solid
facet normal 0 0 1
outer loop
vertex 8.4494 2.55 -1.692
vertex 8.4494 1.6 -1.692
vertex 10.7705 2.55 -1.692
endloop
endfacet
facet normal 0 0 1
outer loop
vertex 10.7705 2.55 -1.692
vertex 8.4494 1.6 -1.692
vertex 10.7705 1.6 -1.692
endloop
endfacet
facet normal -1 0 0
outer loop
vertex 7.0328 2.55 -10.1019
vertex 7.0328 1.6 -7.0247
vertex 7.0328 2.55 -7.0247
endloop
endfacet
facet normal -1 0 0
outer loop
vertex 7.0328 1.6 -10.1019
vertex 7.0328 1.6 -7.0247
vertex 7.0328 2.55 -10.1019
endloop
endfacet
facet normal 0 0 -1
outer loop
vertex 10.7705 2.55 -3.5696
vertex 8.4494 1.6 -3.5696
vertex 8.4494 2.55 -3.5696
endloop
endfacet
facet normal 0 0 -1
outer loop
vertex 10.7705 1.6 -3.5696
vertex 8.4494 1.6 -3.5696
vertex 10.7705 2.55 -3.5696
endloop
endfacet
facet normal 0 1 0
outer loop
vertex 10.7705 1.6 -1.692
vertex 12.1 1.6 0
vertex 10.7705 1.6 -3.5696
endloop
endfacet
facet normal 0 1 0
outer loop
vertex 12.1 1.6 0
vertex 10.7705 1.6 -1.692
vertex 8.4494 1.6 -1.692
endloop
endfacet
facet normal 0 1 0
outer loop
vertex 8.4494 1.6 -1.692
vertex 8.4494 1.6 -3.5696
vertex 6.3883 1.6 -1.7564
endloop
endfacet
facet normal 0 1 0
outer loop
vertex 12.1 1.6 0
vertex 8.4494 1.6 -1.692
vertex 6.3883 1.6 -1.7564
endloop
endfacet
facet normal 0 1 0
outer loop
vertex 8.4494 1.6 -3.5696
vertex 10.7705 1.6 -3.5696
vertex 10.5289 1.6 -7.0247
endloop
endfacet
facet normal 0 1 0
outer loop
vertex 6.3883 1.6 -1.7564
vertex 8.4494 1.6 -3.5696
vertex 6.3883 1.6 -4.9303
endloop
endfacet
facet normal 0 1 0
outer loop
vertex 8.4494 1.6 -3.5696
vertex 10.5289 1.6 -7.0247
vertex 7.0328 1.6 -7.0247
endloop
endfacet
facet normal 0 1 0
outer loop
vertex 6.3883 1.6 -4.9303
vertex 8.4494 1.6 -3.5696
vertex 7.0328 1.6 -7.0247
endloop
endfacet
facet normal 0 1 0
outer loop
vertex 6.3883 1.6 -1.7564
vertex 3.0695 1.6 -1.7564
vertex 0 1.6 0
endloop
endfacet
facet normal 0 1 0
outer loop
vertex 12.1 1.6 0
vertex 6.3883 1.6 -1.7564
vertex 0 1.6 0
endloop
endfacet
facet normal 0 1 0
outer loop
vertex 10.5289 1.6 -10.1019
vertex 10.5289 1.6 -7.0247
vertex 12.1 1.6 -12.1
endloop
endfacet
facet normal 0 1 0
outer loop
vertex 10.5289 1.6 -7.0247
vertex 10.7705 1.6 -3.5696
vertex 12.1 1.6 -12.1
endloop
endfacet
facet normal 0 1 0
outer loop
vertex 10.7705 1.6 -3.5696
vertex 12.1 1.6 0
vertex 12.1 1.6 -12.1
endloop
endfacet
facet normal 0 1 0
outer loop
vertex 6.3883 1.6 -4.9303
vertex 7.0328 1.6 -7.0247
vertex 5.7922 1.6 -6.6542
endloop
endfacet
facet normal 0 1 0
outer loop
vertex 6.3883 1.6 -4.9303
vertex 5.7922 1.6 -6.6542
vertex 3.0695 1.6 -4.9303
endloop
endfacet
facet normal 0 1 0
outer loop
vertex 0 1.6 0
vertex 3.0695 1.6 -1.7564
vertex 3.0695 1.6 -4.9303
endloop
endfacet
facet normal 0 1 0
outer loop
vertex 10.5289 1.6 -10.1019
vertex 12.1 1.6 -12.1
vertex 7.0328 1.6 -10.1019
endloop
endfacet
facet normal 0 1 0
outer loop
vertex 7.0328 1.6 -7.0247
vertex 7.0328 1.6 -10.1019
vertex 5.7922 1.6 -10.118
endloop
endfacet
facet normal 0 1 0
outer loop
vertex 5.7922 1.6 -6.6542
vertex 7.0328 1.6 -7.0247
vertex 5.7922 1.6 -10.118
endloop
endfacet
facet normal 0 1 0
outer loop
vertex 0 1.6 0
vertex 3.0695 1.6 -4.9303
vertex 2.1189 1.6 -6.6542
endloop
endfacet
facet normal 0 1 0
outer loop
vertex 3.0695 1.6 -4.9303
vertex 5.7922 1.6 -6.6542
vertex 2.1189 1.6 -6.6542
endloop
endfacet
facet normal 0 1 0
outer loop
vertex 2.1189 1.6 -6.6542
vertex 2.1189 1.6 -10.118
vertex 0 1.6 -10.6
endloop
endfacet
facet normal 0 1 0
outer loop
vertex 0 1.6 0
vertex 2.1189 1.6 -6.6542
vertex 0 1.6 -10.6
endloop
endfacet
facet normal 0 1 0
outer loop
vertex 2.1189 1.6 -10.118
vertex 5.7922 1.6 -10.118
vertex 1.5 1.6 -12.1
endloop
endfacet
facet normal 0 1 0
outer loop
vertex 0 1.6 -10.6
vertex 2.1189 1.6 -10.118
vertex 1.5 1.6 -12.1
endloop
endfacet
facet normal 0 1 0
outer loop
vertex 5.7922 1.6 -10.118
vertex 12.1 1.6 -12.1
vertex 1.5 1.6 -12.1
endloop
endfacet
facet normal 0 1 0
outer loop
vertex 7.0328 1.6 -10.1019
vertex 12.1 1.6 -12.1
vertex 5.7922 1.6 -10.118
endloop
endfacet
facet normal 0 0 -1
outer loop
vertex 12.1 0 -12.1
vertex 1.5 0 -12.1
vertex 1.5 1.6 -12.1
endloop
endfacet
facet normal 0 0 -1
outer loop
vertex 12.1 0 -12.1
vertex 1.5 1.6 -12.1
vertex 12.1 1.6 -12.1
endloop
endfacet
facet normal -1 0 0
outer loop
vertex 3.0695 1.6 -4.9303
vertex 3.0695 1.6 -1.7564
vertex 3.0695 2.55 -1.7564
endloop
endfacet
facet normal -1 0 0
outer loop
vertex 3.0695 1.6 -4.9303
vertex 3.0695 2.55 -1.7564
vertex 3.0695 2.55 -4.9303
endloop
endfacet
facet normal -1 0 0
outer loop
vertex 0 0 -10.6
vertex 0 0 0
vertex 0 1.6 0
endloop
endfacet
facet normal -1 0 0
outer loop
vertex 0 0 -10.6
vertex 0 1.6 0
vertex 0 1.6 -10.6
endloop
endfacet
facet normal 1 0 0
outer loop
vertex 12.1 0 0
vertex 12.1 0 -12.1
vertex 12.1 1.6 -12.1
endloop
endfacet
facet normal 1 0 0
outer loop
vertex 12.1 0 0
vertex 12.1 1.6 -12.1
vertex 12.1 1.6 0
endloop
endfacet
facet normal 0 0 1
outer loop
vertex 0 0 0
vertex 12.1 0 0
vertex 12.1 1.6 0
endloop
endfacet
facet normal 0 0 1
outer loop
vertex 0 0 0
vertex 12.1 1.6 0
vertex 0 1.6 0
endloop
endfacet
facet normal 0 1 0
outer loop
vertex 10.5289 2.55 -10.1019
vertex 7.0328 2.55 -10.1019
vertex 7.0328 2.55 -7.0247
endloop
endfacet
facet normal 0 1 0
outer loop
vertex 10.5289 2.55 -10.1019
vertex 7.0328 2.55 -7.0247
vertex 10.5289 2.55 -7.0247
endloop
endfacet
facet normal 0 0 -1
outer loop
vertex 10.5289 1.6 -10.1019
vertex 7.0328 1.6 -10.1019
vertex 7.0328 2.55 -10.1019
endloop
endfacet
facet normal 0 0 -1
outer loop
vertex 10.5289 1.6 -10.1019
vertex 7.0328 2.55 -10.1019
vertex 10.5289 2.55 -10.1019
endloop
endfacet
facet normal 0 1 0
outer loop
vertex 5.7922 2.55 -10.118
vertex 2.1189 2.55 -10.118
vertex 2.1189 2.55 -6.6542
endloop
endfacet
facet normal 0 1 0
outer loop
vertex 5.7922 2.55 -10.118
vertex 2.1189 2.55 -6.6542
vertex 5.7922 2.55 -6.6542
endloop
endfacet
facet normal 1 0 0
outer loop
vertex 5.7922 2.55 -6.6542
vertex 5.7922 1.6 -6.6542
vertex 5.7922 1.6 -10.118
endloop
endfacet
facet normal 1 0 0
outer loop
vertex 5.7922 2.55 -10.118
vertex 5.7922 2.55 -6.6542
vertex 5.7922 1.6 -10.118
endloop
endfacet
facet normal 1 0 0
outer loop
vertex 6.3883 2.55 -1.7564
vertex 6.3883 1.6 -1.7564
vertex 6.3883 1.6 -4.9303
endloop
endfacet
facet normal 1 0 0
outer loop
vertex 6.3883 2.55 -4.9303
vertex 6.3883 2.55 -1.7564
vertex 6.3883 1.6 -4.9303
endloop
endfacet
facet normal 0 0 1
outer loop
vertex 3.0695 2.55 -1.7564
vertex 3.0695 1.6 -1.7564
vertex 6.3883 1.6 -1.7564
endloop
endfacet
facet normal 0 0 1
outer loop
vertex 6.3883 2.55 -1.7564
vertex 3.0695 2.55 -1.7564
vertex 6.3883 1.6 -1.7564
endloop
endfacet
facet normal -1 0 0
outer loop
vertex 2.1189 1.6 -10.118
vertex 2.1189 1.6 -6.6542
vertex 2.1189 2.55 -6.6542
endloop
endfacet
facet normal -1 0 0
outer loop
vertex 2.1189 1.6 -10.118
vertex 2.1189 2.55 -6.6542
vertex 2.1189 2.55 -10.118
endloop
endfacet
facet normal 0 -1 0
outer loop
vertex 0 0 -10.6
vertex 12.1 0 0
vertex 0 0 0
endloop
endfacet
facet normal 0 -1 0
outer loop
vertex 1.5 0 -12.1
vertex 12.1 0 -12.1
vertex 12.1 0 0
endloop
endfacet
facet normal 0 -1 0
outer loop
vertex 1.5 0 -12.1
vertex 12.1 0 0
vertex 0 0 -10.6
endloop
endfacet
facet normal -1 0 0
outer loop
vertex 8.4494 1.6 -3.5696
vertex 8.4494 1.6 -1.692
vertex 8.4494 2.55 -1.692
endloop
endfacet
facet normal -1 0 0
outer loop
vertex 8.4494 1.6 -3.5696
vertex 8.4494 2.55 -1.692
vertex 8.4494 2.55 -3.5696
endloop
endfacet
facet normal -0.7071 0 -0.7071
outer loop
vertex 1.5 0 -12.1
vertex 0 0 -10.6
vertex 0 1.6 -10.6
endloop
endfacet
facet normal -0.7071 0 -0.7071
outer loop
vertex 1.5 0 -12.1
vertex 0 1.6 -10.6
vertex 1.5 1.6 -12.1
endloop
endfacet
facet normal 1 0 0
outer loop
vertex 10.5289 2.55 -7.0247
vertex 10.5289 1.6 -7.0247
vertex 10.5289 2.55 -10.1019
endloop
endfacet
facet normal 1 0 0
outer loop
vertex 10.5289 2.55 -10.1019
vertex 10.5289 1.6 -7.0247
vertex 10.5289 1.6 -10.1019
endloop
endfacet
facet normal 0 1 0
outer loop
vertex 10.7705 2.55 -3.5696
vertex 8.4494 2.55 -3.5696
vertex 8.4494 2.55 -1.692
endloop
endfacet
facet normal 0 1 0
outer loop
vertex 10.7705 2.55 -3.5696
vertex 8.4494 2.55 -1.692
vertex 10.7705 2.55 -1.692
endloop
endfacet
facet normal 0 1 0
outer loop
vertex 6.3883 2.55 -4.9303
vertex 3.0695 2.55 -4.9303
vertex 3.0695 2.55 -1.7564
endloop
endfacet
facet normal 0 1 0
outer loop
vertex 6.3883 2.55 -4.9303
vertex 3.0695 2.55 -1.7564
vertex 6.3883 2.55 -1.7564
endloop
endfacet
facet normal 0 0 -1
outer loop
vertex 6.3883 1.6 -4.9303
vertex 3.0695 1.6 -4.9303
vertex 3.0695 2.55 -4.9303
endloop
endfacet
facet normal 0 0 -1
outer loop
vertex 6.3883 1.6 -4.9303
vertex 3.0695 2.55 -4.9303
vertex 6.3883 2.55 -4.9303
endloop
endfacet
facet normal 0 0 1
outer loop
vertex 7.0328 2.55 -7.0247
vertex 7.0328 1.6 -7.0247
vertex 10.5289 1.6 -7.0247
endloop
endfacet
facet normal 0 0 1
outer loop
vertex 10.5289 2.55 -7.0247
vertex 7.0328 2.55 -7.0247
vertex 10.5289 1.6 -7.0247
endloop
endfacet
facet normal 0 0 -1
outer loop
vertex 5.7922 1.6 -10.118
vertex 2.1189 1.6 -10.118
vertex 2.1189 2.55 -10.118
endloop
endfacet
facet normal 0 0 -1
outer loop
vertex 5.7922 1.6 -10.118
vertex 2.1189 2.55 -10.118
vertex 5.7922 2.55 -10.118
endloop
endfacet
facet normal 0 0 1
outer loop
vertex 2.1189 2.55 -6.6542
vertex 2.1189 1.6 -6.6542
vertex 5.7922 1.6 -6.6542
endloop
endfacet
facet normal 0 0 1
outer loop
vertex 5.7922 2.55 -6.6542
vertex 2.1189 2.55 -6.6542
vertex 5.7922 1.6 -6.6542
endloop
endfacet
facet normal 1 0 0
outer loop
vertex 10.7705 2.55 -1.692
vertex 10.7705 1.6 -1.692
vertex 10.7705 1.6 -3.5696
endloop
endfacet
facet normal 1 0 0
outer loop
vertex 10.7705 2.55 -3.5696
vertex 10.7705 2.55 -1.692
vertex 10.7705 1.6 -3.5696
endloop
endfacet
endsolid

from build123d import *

# Parameters (mm, degrees)
EXTRUDE_1_DEPTH = 1.6
SKETCH_2_W      = 3.67331973
SKETCH_2_H      = 3.463876061
SKETCH_2_W_2    = 3.496098164
SKETCH_2_H_2    = 3.077210826
SKETCH_2_W_3    = 3.318876597
SKETCH_2_H_3    = 3.173877135
SKETCH_2_W_4    = 2.321089706
SKETCH_2_H_4    = 1.877636292
EXTRUDE_2_DEPTH = 0.95


with BuildPart() as part:
    # 스케치1 → 보스-돌출1 (new body)
    with BuildSketch(Plane(origin=(0, 0, 0), x_dir=(1, 0, 0), z_dir=(0, 1, 0))):
        Polygon((0, 10.6), (1.5, 12.1), (12.1, 12.1), (12.1, 0), (0, 0), align=None)
    extrude(amount=EXTRUDE_1_DEPTH)

    # 스케치2 → 보스-돌출2 (add)
    with BuildSketch(Plane(origin=(0, 1.6, 0), x_dir=(1, 0, 0), z_dir=(0, 1, 0))):
        with Locations((3.955563312, 8.386102459)):
            Rectangle(SKETCH_2_W, SKETCH_2_H)
        with Locations((8.78082322, 8.563324025)):
            Rectangle(SKETCH_2_W_2, SKETCH_2_H_2)
        with Locations((4.728893782, 3.343343358)):
            Rectangle(SKETCH_2_W_3, SKETCH_2_H_3)
        with Locations((9.60999322, 2.63077873)):
            Rectangle(SKETCH_2_W_4, SKETCH_2_H_4)
    extrude(amount=EXTRUDE_2_DEPTH)


solid = part.part
